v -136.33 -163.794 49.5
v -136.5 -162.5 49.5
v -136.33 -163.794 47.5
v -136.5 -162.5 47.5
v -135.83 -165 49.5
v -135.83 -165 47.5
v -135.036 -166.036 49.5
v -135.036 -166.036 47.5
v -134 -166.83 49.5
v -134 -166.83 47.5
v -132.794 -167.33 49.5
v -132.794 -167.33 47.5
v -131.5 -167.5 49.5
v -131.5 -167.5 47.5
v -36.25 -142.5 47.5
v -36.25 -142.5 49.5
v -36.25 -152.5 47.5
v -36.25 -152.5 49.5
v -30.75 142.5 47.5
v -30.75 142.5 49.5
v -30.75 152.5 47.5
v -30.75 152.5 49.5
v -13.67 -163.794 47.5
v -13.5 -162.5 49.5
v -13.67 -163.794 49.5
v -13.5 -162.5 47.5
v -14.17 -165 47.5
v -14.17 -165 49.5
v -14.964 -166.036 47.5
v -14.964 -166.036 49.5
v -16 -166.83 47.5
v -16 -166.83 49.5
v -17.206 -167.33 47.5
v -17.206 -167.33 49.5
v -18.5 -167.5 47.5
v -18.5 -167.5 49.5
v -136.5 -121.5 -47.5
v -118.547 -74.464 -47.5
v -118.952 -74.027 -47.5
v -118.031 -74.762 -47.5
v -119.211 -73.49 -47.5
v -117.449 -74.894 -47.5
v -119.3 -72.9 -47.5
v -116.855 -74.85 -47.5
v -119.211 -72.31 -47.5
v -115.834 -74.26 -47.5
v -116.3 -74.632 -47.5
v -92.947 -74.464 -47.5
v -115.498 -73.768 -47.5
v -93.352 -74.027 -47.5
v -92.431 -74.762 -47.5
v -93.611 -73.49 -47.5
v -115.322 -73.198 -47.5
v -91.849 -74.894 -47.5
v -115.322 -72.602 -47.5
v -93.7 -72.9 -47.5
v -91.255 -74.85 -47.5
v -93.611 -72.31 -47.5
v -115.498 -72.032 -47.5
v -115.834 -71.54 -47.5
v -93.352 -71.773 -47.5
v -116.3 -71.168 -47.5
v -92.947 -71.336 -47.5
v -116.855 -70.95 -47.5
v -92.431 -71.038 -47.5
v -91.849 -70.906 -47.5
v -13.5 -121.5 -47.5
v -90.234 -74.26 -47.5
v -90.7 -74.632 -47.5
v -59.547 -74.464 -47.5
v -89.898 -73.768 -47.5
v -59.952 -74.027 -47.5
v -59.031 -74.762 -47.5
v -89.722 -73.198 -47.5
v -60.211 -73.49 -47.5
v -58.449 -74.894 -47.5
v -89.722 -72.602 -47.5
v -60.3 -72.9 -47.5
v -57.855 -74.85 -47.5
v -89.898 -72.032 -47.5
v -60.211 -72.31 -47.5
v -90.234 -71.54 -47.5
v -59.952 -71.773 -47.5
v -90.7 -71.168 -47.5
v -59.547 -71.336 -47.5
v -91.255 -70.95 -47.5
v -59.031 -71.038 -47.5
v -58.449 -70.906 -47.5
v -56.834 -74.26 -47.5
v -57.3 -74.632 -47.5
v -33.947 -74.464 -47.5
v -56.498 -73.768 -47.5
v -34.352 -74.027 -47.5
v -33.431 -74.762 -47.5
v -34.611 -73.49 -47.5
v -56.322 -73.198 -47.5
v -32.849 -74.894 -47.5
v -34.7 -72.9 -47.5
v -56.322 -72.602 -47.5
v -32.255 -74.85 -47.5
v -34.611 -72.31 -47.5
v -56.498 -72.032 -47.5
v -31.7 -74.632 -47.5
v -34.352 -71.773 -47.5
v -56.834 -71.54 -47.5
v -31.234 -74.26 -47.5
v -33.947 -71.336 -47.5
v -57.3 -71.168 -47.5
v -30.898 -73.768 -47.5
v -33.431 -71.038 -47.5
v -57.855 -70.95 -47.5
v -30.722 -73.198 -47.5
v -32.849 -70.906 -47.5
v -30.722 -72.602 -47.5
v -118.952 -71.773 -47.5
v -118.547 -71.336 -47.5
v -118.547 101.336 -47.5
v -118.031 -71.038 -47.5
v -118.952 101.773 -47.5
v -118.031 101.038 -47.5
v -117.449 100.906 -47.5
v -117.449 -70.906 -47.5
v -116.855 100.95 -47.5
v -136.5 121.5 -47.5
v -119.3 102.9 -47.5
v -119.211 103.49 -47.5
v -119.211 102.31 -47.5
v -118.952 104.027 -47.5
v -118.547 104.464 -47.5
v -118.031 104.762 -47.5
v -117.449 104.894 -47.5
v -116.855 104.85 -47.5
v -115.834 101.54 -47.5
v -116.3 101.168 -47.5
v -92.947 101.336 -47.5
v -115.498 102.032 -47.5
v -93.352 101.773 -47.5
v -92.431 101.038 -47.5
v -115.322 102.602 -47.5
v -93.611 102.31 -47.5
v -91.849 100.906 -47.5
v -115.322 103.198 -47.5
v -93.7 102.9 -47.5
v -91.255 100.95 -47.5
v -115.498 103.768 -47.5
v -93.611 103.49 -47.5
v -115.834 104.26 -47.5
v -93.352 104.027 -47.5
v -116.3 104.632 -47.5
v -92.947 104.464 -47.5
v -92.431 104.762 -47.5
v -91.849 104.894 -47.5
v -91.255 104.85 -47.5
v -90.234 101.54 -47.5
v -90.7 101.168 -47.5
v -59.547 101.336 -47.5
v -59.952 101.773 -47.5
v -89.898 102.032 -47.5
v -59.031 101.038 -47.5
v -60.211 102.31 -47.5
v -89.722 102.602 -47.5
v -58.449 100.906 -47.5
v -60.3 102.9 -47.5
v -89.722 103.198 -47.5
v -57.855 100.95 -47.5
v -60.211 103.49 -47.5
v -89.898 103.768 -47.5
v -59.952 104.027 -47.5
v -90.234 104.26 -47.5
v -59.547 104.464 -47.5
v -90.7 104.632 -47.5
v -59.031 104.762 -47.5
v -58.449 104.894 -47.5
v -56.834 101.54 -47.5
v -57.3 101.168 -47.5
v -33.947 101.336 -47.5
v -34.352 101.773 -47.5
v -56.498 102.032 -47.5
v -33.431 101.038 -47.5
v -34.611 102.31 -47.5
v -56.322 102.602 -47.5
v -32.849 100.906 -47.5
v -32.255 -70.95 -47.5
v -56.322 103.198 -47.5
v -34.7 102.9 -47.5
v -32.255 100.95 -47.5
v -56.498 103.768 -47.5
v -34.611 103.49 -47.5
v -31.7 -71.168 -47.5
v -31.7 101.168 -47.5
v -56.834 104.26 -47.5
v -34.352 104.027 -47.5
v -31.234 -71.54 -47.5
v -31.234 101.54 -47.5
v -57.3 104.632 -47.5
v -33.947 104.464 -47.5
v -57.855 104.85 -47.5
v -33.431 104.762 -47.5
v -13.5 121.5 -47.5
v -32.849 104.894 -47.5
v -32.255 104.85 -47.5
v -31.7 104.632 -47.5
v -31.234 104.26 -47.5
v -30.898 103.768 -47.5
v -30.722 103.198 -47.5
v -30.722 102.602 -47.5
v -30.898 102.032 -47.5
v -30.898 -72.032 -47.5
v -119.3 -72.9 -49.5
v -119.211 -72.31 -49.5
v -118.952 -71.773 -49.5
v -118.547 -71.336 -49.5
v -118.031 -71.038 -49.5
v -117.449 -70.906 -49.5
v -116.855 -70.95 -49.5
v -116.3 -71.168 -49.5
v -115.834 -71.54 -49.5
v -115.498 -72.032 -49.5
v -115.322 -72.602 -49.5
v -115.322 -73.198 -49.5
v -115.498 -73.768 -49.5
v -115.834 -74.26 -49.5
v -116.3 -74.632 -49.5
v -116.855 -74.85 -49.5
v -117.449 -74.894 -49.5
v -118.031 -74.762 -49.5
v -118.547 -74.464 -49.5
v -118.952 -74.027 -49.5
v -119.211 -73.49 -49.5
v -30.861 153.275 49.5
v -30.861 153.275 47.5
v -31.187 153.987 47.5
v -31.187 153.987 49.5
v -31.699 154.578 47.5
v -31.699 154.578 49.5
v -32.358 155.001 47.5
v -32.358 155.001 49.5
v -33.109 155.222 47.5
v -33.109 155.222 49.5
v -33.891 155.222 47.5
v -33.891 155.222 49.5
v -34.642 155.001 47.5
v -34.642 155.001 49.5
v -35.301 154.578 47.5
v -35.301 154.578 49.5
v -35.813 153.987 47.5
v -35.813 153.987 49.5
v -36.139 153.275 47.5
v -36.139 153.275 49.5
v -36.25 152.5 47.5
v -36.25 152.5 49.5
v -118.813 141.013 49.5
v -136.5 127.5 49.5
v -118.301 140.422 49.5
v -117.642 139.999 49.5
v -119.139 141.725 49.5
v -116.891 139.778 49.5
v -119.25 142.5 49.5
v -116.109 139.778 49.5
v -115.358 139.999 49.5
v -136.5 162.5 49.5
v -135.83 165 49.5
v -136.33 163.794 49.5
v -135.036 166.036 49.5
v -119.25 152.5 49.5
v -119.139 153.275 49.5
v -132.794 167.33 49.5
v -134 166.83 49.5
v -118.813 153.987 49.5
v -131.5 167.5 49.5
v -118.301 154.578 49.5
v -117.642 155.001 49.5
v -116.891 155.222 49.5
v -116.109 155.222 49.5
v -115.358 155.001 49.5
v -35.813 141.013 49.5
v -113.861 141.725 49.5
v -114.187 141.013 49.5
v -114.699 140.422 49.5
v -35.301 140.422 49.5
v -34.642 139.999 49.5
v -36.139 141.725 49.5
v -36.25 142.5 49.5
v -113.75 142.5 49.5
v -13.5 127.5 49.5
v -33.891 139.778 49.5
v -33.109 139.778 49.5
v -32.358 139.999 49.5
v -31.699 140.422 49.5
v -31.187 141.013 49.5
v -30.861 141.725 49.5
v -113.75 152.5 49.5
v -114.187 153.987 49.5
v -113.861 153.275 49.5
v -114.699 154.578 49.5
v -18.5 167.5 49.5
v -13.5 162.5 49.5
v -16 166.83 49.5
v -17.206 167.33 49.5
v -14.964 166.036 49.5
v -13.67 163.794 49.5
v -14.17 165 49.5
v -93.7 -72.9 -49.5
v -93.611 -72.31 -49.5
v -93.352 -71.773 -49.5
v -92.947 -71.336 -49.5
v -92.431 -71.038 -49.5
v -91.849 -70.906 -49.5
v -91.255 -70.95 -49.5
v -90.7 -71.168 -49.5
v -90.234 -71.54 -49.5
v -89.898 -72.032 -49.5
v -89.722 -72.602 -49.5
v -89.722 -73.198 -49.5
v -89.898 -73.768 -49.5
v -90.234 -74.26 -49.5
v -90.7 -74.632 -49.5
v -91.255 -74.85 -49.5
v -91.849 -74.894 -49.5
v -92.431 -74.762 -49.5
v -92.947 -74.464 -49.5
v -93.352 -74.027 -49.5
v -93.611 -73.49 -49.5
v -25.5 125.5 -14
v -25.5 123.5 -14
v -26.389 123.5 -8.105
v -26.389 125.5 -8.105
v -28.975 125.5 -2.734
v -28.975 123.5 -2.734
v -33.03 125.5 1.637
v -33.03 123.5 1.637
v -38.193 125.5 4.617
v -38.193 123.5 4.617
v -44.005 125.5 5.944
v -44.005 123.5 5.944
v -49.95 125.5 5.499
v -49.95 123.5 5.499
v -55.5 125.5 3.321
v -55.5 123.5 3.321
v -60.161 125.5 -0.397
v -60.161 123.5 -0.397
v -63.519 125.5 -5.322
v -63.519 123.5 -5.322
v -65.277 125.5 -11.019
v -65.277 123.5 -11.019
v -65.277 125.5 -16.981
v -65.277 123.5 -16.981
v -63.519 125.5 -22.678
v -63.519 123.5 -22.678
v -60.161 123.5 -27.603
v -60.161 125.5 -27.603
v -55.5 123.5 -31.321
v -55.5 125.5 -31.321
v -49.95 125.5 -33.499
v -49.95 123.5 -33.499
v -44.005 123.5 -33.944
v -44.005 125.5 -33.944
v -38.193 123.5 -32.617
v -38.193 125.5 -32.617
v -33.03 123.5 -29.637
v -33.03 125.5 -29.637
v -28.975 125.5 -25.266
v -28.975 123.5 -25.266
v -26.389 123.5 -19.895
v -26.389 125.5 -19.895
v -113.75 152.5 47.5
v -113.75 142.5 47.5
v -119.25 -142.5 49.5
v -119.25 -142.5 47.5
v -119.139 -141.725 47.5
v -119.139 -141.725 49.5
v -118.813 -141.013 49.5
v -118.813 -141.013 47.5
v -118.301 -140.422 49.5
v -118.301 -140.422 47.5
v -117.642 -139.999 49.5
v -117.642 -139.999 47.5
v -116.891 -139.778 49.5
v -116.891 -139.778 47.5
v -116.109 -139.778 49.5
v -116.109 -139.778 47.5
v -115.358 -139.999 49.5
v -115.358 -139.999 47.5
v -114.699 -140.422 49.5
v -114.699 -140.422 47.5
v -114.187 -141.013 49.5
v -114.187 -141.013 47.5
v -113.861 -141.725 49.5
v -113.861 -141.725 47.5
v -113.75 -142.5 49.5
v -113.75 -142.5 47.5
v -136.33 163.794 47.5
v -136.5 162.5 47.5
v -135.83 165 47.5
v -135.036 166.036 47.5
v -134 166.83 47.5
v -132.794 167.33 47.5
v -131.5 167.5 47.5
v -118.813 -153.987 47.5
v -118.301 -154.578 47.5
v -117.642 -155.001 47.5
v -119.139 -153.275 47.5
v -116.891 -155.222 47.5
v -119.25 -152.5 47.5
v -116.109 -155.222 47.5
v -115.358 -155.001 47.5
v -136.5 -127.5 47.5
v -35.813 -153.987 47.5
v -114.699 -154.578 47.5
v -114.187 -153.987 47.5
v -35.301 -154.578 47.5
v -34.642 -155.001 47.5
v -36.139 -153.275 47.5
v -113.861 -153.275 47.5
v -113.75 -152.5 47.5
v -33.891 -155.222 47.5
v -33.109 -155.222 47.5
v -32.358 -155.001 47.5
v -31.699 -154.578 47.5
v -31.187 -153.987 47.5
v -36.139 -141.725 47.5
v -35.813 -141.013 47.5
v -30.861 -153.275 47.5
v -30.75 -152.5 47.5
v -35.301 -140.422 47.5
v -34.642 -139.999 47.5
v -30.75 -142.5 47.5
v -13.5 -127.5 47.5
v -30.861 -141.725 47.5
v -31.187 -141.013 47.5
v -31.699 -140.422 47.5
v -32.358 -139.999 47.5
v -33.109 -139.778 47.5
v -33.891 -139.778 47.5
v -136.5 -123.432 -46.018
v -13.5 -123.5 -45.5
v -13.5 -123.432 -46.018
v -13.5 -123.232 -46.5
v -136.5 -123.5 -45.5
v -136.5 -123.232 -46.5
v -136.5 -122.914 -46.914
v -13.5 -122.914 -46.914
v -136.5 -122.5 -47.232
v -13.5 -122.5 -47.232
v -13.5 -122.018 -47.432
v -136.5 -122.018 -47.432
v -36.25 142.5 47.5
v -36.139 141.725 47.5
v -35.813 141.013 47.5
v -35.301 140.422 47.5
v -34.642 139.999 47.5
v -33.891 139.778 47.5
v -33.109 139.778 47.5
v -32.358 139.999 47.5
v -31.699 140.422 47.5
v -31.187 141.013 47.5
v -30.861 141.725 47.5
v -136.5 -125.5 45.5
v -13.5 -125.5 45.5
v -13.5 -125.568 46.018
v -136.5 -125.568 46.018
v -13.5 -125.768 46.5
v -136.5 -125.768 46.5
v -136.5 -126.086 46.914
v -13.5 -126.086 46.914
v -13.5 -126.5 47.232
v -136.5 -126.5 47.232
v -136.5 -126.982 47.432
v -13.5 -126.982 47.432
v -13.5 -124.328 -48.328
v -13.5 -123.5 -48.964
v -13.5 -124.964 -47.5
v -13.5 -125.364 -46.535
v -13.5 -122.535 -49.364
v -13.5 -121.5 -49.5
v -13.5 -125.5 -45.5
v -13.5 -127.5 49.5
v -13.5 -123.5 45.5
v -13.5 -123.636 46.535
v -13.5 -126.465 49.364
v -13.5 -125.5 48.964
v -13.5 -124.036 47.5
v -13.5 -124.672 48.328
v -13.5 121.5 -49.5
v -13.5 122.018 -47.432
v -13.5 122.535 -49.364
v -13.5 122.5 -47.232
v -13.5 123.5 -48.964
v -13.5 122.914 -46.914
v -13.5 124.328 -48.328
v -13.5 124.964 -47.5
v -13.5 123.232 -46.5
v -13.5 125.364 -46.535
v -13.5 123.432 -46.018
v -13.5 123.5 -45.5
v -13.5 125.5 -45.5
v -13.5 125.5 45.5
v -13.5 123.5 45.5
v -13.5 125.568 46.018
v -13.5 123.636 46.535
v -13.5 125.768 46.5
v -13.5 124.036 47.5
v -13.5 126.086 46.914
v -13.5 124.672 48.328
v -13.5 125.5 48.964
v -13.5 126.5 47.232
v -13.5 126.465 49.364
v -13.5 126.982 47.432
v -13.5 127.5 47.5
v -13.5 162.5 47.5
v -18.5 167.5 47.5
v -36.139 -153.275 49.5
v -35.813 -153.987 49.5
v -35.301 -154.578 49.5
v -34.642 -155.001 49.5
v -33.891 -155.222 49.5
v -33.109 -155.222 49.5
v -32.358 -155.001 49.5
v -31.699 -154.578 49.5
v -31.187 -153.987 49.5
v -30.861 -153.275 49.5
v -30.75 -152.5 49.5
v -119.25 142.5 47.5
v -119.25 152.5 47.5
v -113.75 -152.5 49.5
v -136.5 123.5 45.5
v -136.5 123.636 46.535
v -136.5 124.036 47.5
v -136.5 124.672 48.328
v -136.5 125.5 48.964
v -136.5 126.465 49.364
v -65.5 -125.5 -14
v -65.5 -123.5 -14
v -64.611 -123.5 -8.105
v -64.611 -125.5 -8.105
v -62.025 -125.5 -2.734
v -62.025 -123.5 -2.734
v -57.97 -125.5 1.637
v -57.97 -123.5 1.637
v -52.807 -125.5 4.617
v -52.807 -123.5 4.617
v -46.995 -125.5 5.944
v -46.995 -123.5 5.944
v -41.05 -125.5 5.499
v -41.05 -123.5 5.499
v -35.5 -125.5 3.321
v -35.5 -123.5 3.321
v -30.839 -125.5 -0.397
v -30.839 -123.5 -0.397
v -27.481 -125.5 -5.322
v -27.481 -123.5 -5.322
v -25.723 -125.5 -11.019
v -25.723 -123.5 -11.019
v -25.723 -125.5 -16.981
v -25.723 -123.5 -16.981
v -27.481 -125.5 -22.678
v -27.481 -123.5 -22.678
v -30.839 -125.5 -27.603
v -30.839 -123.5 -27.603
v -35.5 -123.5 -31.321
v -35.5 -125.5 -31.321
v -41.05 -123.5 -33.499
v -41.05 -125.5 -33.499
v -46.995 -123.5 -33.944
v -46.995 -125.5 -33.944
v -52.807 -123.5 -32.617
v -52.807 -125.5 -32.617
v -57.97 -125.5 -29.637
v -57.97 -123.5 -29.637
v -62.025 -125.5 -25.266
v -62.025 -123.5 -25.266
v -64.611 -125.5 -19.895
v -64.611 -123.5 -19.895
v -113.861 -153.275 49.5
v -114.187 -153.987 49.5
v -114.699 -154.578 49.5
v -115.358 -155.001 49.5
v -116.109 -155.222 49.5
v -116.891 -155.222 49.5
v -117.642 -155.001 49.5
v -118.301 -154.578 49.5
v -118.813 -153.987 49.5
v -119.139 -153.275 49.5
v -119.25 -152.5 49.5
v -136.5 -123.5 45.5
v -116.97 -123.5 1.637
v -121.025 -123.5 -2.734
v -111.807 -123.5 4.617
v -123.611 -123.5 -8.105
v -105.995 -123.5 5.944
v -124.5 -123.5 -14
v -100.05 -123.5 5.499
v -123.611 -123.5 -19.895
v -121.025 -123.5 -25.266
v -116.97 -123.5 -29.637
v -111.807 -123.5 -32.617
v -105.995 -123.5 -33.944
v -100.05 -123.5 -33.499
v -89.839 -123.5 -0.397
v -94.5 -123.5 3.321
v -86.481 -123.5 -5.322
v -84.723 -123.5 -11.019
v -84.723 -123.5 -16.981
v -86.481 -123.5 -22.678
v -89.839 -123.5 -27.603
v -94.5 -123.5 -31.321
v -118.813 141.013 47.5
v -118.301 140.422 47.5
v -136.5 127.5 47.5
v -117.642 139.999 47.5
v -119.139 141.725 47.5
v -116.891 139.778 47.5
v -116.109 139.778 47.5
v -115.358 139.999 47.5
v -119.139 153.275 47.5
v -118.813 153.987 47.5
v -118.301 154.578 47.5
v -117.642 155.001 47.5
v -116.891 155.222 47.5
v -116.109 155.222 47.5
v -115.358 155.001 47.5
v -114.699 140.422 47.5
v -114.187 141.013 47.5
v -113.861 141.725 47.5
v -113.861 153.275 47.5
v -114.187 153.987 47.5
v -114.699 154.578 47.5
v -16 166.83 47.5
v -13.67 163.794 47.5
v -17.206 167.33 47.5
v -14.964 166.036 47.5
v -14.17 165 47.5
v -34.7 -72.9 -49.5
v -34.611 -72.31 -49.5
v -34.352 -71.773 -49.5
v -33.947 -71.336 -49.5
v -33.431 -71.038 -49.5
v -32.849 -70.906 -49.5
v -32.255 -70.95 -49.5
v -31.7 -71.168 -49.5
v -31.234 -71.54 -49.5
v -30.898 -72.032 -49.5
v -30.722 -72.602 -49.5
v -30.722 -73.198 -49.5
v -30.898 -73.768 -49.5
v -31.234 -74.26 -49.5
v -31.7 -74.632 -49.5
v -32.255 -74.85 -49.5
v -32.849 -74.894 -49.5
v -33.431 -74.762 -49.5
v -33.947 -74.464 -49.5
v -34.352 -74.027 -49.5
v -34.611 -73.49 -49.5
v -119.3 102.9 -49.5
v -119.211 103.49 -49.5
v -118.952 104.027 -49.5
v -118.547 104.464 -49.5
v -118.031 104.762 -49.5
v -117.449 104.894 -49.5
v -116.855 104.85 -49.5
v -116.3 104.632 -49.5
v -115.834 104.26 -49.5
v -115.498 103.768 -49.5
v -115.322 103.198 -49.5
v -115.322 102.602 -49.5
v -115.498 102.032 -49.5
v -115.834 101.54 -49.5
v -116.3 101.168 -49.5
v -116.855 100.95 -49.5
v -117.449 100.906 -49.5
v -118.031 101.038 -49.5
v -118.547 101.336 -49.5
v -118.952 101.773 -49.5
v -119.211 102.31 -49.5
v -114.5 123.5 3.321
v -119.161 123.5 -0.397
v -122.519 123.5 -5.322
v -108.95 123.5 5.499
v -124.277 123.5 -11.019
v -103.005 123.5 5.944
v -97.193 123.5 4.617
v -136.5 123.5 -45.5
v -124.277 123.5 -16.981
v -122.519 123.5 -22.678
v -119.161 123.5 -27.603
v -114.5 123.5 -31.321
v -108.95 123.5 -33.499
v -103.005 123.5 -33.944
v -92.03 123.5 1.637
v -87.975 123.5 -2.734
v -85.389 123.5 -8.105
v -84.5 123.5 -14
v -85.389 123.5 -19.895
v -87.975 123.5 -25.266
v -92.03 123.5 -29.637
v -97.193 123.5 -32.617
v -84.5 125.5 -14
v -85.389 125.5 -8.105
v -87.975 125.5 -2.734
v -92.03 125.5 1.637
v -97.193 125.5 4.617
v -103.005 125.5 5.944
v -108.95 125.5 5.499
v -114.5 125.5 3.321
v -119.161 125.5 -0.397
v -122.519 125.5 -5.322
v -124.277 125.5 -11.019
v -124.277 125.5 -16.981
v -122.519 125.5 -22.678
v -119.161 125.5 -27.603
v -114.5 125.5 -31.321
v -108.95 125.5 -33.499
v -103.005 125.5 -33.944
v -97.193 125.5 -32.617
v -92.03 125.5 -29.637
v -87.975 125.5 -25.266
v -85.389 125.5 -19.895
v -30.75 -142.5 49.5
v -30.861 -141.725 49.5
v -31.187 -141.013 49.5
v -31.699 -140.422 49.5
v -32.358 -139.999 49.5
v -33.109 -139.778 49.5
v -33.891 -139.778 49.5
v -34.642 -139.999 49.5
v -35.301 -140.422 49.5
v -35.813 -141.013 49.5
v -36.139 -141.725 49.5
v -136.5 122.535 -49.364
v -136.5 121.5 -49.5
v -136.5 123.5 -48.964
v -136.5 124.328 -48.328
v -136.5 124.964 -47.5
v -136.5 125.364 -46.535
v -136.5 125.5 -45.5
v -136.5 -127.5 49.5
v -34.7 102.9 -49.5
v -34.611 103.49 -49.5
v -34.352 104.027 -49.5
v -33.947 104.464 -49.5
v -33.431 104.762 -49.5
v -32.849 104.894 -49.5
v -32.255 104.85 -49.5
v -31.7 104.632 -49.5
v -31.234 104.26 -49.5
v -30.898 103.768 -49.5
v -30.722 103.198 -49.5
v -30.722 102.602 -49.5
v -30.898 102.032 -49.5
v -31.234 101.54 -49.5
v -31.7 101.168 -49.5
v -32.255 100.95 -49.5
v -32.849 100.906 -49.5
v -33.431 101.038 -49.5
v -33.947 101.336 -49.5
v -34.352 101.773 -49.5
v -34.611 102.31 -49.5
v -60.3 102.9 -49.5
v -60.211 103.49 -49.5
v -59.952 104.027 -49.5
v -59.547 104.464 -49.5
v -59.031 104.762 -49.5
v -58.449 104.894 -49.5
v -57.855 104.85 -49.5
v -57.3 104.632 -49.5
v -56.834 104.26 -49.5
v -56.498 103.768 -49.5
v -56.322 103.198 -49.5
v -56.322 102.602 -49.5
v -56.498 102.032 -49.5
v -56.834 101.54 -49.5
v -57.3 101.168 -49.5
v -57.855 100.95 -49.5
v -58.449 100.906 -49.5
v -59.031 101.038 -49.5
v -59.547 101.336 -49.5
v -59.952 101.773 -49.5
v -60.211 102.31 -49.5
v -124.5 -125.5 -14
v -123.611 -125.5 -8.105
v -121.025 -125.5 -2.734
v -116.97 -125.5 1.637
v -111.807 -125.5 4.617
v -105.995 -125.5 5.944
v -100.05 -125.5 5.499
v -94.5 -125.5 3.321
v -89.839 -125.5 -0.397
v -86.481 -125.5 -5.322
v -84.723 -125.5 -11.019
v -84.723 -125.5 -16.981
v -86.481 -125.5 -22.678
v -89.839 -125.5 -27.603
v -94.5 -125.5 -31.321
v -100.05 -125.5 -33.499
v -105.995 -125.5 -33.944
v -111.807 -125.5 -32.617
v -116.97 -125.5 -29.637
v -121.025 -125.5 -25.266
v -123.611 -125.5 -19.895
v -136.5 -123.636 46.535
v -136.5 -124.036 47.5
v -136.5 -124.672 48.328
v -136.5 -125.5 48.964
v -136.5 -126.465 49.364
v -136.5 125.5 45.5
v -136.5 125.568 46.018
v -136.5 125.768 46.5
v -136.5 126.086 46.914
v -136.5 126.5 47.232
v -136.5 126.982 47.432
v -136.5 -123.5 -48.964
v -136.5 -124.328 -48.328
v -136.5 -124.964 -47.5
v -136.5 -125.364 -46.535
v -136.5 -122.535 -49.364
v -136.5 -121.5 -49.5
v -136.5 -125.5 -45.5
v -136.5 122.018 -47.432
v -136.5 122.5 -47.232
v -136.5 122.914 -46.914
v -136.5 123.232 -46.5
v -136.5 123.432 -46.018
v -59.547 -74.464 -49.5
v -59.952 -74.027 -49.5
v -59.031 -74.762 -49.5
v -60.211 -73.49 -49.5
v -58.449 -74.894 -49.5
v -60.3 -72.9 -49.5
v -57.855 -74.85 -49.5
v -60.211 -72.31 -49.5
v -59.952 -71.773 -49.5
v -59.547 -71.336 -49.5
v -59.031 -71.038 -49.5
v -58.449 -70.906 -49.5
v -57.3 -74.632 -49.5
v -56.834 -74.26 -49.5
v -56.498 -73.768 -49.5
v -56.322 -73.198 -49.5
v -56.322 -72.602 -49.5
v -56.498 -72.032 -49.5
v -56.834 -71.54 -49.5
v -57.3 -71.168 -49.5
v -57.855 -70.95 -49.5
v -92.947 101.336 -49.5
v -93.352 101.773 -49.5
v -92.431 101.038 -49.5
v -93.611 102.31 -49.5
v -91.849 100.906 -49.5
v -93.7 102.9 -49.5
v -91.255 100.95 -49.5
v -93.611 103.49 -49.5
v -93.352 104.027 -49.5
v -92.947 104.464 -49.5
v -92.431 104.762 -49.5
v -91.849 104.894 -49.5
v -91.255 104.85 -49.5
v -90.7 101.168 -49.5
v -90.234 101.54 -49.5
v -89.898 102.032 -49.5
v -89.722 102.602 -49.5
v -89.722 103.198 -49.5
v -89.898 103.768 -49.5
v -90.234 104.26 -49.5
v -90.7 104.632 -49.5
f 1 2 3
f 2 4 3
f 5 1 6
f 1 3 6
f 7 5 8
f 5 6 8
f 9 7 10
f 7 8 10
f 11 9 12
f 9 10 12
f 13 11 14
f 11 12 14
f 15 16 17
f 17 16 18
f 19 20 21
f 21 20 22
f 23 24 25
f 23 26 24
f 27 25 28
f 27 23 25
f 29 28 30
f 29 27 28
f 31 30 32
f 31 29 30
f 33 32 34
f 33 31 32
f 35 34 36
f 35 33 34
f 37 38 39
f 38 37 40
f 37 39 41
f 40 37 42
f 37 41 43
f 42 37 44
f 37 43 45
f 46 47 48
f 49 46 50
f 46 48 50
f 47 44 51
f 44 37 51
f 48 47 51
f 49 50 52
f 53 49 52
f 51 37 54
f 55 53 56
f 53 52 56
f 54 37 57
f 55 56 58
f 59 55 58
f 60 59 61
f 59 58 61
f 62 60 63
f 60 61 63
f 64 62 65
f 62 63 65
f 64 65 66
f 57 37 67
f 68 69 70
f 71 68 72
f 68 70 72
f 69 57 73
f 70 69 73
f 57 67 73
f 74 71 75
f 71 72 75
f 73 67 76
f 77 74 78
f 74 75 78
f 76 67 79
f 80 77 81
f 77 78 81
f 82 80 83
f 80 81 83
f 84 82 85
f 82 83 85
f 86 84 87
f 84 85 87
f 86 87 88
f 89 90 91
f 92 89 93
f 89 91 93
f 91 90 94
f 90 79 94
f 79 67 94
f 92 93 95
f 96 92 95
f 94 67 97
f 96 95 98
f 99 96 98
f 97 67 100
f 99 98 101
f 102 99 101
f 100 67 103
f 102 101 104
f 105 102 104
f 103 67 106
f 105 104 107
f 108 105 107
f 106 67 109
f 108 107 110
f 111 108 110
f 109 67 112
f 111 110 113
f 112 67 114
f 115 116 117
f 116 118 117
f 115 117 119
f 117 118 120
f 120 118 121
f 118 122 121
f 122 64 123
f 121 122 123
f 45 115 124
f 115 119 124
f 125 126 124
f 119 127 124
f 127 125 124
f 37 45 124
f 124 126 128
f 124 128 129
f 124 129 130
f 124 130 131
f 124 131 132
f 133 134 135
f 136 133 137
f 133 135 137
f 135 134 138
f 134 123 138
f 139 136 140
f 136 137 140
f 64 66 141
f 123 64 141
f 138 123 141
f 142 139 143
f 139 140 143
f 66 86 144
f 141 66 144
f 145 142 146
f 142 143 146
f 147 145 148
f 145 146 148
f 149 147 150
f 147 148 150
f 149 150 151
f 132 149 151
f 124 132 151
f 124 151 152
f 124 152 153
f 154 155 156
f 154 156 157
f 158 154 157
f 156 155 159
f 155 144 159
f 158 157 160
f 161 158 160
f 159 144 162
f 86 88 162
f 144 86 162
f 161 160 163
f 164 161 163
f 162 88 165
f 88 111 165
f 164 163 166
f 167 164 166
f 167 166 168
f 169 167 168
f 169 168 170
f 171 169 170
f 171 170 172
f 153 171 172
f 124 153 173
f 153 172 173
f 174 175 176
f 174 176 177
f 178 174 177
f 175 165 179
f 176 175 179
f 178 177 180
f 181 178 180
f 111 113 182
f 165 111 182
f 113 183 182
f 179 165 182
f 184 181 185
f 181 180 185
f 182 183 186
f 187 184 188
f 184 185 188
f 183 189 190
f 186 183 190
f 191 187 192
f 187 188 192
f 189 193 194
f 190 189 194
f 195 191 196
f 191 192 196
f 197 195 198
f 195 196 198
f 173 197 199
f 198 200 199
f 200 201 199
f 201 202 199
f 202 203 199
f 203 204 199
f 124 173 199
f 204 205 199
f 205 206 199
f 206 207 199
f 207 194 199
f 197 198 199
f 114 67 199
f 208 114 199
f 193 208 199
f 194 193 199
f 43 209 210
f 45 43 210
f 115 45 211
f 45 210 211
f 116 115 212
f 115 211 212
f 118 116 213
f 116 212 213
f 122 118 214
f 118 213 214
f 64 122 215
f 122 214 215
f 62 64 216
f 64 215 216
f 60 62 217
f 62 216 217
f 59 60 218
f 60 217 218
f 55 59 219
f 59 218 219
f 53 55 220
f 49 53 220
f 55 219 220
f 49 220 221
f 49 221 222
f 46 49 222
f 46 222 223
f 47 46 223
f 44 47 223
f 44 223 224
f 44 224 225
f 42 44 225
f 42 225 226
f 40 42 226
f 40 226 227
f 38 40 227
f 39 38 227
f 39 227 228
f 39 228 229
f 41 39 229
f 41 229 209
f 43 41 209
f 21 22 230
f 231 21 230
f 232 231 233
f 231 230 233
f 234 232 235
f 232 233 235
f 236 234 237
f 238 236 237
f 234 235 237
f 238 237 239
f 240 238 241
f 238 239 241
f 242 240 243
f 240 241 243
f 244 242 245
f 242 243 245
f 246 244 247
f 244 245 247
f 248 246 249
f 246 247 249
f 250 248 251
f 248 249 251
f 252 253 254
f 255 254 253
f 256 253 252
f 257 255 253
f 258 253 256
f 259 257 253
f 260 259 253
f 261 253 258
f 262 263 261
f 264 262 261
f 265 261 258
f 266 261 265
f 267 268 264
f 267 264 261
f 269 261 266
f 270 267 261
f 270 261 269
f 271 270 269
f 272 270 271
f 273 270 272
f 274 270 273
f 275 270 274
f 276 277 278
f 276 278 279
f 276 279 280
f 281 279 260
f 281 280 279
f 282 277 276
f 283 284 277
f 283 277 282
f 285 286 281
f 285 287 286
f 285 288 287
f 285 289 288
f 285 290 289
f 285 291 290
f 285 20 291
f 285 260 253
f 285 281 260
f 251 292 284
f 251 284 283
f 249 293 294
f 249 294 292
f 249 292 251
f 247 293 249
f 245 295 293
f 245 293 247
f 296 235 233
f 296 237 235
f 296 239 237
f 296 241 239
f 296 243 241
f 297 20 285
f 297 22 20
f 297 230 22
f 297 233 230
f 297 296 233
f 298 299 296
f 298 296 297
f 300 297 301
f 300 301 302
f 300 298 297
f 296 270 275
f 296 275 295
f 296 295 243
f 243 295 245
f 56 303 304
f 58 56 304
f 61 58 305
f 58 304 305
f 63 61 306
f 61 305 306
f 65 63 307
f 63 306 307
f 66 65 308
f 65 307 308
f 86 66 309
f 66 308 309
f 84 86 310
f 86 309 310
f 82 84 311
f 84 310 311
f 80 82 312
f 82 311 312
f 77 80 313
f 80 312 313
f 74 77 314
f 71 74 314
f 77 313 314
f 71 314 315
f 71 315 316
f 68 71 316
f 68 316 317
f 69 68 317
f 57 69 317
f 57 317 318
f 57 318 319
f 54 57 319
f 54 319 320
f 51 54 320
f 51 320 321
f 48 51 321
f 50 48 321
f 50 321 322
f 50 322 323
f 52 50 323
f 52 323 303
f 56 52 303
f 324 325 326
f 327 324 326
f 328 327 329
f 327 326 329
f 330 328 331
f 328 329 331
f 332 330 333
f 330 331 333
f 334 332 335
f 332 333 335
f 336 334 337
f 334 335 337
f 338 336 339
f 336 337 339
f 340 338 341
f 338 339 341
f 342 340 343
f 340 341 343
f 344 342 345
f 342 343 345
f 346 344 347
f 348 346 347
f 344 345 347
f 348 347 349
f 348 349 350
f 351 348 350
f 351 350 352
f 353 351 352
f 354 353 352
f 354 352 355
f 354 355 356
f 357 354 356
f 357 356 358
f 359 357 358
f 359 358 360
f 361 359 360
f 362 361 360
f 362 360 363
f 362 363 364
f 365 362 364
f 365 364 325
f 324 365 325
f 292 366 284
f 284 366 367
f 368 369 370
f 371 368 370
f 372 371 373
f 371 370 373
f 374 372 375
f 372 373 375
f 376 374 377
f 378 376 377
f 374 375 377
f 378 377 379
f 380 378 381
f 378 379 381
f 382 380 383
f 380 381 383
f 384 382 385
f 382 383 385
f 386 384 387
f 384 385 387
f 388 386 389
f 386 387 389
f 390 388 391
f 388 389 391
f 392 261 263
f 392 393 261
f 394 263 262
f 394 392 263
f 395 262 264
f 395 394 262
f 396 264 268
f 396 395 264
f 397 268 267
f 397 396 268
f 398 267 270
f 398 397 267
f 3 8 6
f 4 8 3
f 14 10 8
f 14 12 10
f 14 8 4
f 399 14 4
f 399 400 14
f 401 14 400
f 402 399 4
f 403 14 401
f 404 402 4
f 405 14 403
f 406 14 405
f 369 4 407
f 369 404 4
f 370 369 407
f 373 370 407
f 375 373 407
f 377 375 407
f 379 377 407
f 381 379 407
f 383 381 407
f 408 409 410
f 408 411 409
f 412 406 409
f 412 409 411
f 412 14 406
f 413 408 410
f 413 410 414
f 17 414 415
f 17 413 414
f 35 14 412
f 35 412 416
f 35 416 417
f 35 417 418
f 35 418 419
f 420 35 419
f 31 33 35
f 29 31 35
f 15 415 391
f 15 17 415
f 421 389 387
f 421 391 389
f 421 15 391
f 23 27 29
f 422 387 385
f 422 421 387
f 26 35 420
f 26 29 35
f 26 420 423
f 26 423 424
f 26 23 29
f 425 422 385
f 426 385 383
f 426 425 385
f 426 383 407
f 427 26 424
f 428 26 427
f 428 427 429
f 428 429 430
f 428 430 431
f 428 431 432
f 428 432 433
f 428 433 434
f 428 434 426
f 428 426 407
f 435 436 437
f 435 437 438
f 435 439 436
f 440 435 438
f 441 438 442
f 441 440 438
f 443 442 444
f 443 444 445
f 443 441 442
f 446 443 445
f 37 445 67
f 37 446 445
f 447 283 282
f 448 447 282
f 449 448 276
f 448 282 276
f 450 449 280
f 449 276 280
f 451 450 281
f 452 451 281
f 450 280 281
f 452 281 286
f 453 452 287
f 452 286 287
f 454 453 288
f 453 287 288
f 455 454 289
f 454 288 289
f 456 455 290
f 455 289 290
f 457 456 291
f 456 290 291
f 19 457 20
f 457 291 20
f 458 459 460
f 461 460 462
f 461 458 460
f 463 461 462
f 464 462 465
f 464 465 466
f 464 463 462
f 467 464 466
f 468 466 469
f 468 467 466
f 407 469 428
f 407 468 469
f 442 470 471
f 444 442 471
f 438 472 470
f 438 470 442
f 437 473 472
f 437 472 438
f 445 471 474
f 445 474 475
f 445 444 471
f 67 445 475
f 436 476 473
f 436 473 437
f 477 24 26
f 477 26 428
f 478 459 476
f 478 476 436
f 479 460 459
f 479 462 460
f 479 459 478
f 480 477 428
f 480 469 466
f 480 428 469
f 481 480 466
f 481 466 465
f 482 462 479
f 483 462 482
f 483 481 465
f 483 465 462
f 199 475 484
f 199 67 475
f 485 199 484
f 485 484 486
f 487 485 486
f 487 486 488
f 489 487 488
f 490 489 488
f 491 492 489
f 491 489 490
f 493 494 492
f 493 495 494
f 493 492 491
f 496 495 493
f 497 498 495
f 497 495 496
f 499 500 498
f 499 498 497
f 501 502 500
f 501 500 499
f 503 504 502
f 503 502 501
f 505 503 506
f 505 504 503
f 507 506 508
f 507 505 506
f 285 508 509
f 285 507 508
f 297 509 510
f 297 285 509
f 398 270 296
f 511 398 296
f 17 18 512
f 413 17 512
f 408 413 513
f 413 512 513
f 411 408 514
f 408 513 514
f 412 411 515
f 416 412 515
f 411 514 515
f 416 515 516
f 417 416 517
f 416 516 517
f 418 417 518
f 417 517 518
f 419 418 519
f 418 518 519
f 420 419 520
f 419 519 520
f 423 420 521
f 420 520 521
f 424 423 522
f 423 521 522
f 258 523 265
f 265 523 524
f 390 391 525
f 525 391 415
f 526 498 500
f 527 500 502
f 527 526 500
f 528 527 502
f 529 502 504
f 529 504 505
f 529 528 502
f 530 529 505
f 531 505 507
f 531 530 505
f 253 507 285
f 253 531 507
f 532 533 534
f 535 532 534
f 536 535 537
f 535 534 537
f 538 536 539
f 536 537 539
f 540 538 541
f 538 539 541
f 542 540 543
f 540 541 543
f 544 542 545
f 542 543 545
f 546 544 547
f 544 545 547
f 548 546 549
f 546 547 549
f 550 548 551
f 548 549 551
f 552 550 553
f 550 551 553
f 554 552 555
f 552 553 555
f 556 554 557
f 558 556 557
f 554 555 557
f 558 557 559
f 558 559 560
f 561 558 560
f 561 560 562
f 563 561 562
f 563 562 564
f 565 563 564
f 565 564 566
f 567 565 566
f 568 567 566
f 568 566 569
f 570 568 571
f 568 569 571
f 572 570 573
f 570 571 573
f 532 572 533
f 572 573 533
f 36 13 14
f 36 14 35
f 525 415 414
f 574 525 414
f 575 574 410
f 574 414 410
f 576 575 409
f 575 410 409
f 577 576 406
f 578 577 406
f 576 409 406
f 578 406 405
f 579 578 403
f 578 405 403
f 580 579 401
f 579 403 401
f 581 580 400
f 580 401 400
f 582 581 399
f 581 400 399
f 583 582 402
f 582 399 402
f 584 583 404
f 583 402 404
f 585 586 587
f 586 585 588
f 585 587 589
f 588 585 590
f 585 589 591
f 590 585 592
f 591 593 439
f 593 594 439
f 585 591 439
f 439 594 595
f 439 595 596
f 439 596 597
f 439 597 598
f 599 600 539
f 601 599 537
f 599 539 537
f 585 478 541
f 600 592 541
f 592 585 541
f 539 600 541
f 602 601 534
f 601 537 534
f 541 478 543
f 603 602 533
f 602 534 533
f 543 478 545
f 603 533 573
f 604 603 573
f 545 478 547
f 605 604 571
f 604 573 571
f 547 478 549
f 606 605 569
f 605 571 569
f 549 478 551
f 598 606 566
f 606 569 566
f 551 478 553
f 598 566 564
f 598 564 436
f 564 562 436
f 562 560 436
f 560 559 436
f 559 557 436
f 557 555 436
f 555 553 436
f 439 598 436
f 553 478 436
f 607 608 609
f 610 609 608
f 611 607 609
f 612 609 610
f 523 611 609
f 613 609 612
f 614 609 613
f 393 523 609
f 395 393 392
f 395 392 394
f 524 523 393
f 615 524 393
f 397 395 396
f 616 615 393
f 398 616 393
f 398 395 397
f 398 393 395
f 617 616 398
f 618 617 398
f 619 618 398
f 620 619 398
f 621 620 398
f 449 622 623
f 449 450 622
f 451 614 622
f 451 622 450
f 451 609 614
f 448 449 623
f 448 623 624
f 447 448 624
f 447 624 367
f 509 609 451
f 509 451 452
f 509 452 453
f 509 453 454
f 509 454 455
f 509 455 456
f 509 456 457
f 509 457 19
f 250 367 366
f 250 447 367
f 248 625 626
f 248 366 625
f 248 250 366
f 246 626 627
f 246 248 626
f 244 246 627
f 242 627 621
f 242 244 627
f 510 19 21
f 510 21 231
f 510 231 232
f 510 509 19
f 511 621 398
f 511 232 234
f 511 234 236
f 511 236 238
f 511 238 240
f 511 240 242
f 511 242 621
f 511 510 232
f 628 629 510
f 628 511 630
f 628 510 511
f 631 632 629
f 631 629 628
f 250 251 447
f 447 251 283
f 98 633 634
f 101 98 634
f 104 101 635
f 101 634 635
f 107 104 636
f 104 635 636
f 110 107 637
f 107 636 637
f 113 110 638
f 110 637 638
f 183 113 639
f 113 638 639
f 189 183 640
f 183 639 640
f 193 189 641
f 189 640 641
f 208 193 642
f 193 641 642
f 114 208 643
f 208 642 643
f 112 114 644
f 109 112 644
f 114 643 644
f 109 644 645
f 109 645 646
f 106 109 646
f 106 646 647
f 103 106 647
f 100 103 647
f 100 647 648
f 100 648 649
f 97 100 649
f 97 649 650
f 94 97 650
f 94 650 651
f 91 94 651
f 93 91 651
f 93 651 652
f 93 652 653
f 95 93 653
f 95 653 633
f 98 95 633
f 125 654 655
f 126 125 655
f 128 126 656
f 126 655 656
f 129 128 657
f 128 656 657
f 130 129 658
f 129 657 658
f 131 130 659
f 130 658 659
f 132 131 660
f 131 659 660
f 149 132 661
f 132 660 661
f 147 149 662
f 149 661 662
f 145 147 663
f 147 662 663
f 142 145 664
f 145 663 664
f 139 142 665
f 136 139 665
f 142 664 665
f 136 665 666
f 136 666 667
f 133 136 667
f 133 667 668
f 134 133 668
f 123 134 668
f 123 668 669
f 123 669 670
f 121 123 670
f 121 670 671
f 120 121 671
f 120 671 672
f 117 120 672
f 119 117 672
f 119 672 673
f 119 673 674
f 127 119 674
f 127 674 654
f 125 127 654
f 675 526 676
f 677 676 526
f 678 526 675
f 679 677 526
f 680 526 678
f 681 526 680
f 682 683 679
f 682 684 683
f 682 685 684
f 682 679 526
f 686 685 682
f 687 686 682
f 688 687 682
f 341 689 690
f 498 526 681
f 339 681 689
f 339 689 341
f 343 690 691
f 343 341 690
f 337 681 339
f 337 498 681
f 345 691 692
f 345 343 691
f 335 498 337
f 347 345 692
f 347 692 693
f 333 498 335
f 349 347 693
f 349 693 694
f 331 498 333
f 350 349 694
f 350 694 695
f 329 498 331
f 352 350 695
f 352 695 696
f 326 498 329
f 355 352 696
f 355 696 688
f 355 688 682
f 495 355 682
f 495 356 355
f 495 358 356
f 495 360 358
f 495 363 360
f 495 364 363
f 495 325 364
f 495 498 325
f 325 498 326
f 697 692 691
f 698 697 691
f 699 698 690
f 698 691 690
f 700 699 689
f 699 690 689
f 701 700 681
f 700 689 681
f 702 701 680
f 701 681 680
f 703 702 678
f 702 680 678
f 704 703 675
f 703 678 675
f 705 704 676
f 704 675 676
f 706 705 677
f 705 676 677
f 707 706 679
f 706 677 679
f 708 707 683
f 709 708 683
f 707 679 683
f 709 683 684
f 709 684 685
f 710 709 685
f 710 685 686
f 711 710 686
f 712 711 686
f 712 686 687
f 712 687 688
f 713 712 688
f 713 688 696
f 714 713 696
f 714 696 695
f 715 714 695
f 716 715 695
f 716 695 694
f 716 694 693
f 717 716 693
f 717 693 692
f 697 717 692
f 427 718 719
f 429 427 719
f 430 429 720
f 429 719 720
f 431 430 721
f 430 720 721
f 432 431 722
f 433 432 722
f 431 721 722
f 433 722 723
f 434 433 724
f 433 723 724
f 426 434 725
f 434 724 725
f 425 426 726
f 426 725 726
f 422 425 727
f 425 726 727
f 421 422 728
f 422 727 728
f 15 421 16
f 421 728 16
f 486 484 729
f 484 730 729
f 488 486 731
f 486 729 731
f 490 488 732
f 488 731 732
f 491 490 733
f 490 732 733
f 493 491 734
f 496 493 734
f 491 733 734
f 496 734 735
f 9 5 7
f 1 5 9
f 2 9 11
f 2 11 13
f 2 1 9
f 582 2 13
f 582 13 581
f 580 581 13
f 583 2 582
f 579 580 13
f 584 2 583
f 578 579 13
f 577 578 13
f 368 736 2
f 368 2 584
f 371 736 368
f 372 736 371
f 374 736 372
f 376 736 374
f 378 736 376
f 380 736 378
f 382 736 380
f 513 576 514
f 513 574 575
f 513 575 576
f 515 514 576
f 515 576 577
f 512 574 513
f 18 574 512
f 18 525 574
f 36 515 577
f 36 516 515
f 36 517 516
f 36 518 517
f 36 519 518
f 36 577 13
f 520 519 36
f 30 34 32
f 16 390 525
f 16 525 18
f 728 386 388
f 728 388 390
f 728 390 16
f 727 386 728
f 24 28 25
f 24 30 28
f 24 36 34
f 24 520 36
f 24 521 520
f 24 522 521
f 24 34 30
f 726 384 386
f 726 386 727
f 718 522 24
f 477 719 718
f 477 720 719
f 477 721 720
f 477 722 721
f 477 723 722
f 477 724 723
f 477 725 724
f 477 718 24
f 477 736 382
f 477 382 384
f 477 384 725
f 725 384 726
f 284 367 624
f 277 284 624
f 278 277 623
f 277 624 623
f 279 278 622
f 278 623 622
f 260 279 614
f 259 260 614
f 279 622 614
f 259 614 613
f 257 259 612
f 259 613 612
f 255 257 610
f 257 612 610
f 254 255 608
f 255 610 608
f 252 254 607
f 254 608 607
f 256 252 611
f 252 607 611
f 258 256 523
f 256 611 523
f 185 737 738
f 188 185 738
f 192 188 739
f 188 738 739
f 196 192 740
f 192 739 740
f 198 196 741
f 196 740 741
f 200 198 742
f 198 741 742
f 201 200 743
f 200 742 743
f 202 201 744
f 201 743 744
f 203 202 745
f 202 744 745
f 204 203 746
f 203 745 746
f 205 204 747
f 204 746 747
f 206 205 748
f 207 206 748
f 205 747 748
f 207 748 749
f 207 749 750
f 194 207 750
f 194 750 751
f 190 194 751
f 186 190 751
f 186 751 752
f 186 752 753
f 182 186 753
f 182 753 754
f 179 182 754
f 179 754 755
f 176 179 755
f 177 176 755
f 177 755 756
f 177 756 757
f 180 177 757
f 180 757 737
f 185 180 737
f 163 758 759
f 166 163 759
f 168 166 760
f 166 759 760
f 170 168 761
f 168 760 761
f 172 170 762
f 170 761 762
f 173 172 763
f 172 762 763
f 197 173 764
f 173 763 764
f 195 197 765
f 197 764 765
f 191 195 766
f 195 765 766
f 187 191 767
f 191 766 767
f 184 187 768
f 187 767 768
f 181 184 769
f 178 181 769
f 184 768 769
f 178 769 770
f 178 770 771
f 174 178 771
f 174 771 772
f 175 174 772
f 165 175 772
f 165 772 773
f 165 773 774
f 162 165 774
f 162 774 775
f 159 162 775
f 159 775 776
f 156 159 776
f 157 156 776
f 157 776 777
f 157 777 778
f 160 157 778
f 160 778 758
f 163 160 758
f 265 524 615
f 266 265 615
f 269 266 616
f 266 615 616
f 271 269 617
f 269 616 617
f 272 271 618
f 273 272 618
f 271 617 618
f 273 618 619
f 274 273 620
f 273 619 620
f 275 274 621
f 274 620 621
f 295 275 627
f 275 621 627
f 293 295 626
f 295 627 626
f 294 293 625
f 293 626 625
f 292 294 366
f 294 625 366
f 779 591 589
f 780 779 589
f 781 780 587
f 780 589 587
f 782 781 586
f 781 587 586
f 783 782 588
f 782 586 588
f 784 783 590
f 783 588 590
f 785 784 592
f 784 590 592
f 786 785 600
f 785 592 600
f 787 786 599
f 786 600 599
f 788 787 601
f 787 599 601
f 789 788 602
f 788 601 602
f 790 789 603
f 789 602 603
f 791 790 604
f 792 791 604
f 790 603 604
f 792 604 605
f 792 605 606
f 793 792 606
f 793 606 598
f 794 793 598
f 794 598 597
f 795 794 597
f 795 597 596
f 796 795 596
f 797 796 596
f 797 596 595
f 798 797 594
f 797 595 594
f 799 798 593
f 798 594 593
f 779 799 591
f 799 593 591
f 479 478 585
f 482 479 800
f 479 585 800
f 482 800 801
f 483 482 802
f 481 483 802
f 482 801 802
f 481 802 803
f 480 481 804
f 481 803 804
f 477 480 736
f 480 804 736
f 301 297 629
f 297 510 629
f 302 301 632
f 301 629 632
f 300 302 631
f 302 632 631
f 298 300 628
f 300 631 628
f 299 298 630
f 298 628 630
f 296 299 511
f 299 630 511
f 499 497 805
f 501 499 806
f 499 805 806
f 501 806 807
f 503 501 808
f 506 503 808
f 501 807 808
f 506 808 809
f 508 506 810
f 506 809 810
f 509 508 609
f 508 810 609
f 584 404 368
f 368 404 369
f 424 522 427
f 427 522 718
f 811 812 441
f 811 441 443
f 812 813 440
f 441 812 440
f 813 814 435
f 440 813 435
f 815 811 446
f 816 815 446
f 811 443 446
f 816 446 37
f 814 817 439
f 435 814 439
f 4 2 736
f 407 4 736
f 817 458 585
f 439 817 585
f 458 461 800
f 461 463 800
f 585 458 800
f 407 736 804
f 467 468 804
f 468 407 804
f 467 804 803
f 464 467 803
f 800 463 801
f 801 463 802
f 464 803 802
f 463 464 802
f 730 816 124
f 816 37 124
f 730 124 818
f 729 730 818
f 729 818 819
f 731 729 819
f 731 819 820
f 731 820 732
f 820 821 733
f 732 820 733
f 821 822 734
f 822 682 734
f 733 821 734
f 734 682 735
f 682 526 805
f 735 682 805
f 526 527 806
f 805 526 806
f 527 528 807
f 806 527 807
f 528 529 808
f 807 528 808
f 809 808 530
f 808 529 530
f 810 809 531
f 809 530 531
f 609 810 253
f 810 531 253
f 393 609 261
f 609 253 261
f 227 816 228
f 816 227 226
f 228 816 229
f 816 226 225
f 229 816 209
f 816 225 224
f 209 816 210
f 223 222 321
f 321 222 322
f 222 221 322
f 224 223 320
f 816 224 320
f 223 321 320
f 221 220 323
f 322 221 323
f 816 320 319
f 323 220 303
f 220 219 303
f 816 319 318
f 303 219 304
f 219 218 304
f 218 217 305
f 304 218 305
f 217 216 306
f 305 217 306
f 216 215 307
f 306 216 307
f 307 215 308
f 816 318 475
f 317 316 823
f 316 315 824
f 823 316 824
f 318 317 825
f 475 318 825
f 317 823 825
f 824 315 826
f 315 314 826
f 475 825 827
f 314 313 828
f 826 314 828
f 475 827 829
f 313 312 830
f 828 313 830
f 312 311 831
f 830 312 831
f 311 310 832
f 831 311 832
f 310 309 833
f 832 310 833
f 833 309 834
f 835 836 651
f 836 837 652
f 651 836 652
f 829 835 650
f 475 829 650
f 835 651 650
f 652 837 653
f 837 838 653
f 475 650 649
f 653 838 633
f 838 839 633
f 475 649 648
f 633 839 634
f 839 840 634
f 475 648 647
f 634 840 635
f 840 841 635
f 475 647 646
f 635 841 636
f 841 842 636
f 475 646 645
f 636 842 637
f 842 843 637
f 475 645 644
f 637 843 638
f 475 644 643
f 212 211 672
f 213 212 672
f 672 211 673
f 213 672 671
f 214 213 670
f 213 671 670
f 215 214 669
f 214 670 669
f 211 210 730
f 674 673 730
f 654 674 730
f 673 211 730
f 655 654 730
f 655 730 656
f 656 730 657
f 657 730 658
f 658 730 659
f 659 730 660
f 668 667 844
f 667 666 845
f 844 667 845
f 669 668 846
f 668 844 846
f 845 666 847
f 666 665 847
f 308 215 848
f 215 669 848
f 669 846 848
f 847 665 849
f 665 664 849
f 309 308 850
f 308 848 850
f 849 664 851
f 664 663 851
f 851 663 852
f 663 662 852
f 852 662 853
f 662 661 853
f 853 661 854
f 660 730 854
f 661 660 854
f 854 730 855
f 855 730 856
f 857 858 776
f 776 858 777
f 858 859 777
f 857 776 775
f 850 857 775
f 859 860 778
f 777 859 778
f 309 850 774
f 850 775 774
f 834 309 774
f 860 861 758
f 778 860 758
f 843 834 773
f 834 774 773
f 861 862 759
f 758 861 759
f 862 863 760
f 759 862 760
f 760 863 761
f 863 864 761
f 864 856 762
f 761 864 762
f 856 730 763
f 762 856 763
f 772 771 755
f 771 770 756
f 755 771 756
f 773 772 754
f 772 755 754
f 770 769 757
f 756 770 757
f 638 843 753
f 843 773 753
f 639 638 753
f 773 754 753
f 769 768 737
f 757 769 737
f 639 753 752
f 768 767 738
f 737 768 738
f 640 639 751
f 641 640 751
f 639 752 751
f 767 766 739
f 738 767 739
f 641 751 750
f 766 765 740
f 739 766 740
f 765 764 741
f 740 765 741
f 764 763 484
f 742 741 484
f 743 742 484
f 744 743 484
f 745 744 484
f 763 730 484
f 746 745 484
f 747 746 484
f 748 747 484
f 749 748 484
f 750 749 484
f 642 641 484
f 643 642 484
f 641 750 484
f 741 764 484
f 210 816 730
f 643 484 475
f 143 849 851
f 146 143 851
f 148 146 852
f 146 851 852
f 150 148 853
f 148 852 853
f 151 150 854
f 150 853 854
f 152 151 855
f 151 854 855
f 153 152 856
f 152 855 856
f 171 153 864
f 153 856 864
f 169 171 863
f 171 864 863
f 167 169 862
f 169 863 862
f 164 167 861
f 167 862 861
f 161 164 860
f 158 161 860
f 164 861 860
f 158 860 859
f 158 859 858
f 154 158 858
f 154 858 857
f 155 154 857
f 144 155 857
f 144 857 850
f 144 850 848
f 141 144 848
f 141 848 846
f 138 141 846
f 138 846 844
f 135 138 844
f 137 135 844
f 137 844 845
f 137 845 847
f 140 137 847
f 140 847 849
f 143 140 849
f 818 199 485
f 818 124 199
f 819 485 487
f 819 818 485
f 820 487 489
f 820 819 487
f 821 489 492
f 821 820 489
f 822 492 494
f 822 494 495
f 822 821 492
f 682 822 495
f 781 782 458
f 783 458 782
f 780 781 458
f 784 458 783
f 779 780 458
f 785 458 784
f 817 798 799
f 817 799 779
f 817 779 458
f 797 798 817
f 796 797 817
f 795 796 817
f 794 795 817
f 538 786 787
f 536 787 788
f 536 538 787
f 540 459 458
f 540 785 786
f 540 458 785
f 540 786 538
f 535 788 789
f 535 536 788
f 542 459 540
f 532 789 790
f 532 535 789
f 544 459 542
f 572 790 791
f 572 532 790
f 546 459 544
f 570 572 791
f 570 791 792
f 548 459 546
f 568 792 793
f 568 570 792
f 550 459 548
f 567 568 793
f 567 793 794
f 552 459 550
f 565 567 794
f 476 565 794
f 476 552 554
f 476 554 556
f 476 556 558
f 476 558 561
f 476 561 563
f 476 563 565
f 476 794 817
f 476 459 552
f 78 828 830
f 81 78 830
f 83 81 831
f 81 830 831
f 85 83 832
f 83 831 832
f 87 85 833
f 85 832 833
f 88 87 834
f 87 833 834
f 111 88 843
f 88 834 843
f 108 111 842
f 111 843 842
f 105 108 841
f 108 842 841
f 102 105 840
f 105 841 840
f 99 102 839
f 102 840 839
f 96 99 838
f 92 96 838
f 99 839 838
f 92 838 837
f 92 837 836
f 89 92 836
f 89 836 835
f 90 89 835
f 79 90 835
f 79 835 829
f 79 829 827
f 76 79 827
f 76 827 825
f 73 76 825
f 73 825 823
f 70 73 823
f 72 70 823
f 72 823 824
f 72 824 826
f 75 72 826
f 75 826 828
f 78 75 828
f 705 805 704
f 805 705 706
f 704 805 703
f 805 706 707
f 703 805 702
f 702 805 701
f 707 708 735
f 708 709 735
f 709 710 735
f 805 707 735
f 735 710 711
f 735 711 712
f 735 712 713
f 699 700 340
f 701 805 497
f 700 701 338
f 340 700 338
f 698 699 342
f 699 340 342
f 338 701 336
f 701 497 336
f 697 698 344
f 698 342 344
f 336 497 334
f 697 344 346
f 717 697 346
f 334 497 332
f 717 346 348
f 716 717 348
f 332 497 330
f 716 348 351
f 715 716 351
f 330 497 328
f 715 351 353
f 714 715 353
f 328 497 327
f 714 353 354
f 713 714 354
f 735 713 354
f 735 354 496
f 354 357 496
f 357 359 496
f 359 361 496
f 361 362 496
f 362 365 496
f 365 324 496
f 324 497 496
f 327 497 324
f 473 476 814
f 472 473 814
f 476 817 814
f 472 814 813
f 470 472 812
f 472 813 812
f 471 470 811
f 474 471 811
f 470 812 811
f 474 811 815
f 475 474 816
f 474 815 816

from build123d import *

# Parameters (mm, degrees)
SKETCH_1_W           = 123
SKETCH_1_H           = 335
EXTRUDE_1_DEPTH      = 99
SKETCH_2_W           = 97
SKETCH_2_H           = 247
CUT_EXTRUDE_1_DEPTH  = 214.62467086
SKETCH_3_W           = 97
SKETCH_3_H           = 42
CUT_EXTRUDE_2_DEPTH  = 214.62467086
SKETCH_4_W           = 97
SKETCH_4_H           = 42
CUT_EXTRUDE_3_DEPTH  = 214.62467086
CUT_EXTRUDE_4_DEPTH  = 238.675198538
CUT_EXTRUDE_5_DEPTH  = 237.849108084
CUT_EXTRUDE_6_DEPTH  = 238.675198538
CUT_EXTRUDE_7_DEPTH  = 237.849108084
HOLE_WIZARD_M4_1_D   = 4
HOLE_WIZARD_M4_2_D   = 4
HOLE_WIZARD_M4_3_D   = 4
HOLE_WIZARD_M4_4_D   = 4
HOLE_WIZARD_M4_5_D   = 4
HOLE_WIZARD_M4_6_D   = 4
HOLE_WIZARD_M4_7_D   = 4
HOLE_WIZARD_M4_8_D   = 4
HOLE_WIZARD_9_D      = 40
HOLE_WIZARD_9_DEPTH  = 2
HOLE_WIZARD_10_D     = 40
HOLE_WIZARD_10_DEPTH = 2
HOLE_WIZARD_11_D     = 40
HOLE_WIZARD_11_DEPTH = 293
HOLE_WIZARD_12_D     = 40
HOLE_WIZARD_12_DEPTH = 293
FILLET_1_R           = 2
FILLET_2_R           = 2
FILLET_3_R           = 2
FILLET_4_R           = 2
FILLET_5_R           = 4
FILLET_6_R           = 4
FILLET_7_R           = 4
FILLET_8_R           = 4
FILLET_9_R           = 5
FILLET_10_R          = 5
FILLET_11_R          = 5
FILLET_12_R          = 5


with BuildPart() as part:
    # 草图1 → 凸台-拉伸1 (new body)
    with BuildSketch(Plane.XY.offset(49.5)):
        with Locations((-75, 0)):
            Rectangle(SKETCH_1_W, SKETCH_1_H)
    extrude(amount=-EXTRUDE_1_DEPTH)

    # 草图2 → 切除-拉伸1 (cut, through all)
    with BuildSketch(Plane(origin=(-13.5, 0, 0), x_dir=(0, 0, -1), z_dir=(1, 0, 0))):
        with Locations((-1, 0)):
            Rectangle(SKETCH_2_W, SKETCH_2_H)
    extrude(amount=-CUT_EXTRUDE_1_DEPTH, mode=Mode.SUBTRACT)

    # 草图3 → 切除-拉伸2 (cut, through all)
    with BuildSketch(Plane(origin=(-13.5, 0, 0), x_dir=(0, 0, -1), z_dir=(1, 0, 0))):
        with Locations((1, 146.5)):
            Rectangle(SKETCH_3_W, SKETCH_3_H)
    extrude(amount=-CUT_EXTRUDE_2_DEPTH, mode=Mode.SUBTRACT)

    # 草图4 → 切除-拉伸3 (cut, through all)
    with BuildSketch(Plane(origin=(-13.5, 0, 0), x_dir=(0, 0, -1), z_dir=(1, 0, 0))):
        with Locations((1, -146.5)):
            Rectangle(SKETCH_4_W, SKETCH_4_H)
    extrude(amount=-CUT_EXTRUDE_3_DEPTH, mode=Mode.SUBTRACT)

    # 草图5 → 切除-拉伸4 (cut, through all)
    with BuildSketch(Plane.XY.offset(49.5)):
        with BuildLine():
            Line((-30.75, 142.5), (-30.75, 152.5))
            ThreePointArc((-30.75, 152.5), (-33.5, 155.25), (-36.25, 152.5))
            Line((-36.25, 152.5), (-36.25, 142.5))
            ThreePointArc((-36.25, 142.5), (-33.5, 139.75), (-30.75, 142.5))
        make_face()
    extrude(amount=-CUT_EXTRUDE_4_DEPTH, mode=Mode.SUBTRACT)

    # 草图6 → 切除-拉伸5 (cut, through all)
    with BuildSketch(Plane(origin=(0, 0, 47.5), x_dir=(-1, 0, 0), z_dir=(0, 0, -1))):
        with BuildLine():
            Line((113.75, 152.5), (113.75, 142.5))
            ThreePointArc((113.75, 142.5), (116.5, 139.75), (119.25, 142.5))
            Line((119.25, 142.5), (119.25, 152.5))
            ThreePointArc((119.25, 152.5), (116.5, 155.25), (113.75, 152.5))
        make_face()
    extrude(amount=-CUT_EXTRUDE_5_DEPTH, mode=Mode.SUBTRACT)

    # 草图7 → 切除-拉伸6 (cut, through all)
    with BuildSketch(Plane.XY.offset(49.5)):
        with BuildLine():
            Line((-30.75, -152.5), (-30.75, -142.5))
            ThreePointArc((-30.75, -142.5), (-33.5, -139.75), (-36.25, -142.5))
            Line((-36.25, -142.5), (-36.25, -152.5))
            ThreePointArc((-36.25, -152.5), (-33.5, -155.25), (-30.75, -152.5))
        make_face()
    extrude(amount=-CUT_EXTRUDE_6_DEPTH, mode=Mode.SUBTRACT)

    # 草图8 → 切除-拉伸7 (cut, through all)
    with BuildSketch(Plane(origin=(0, 0, 47.5), x_dir=(-1, 0, 0), z_dir=(0, 0, -1))):
        with BuildLine():
            Line((113.75, -142.5), (113.75, -152.5))
            ThreePointArc((113.75, -152.5), (116.5, -155.25), (119.25, -152.5))
            Line((119.25, -152.5), (119.25, -142.5))
            ThreePointArc((119.25, -142.5), (116.5, -139.75), (113.75, -142.5))
        make_face()
    extrude(amount=-CUT_EXTRUDE_7_DEPTH, mode=Mode.SUBTRACT)

    # M4 螺纹孔1 (through all)
    with Locations(Plane.XY.offset(-47.5)):
        with Locations((-117.3, -72.9)):
            Hole(HOLE_WIZARD_M4_1_D / 2)

    # M4 螺纹孔2 (through all)
    with Locations(Plane.XY.offset(-47.5)):
        with Locations((-91.7, -72.9)):
            Hole(HOLE_WIZARD_M4_2_D / 2)

    # M4 螺纹孔3 (through all)
    with Locations(Plane.XY.offset(-47.5)):
        with Locations((-32.7, -72.9)):
            Hole(HOLE_WIZARD_M4_3_D / 2)

    # M4 螺纹孔4 (through all)
    with Locations(Plane.XY.offset(-47.5)):
        with Locations((-58.3, -72.9)):
            Hole(HOLE_WIZARD_M4_4_D / 2)

    # M4 螺纹孔5 (through all)
    with Locations(Plane.XY.offset(-47.5)):
        with Locations((-91.7, 102.9)):
            Hole(HOLE_WIZARD_M4_5_D / 2)

    # M4 螺纹孔6 (through all)
    with Locations(Plane.XY.offset(-47.5)):
        with Locations((-117.3, 102.9)):
            Hole(HOLE_WIZARD_M4_6_D / 2)

    # M4 螺纹孔7 (through all)
    with Locations(Plane.XY.offset(-47.5)):
        with Locations((-32.7, 102.9)):
            Hole(HOLE_WIZARD_M4_7_D / 2)

    # M4 螺纹孔8 (through all)
    with Locations(Plane.XY.offset(-47.5)):
        with Locations((-58.3, 102.9)):
            Hole(HOLE_WIZARD_M4_8_D / 2)

    # 孔9
    with Locations(Plane.XZ.offset(125.5)):
        with Locations((-45.5, -14)):
            Hole(HOLE_WIZARD_9_D / 2, depth=HOLE_WIZARD_9_DEPTH)

    # 孔10
    with Locations(Plane.XZ.offset(125.5)):
        with Locations((-104.5, -14)):
            Hole(HOLE_WIZARD_10_D / 2, depth=HOLE_WIZARD_10_DEPTH)

    # 孔11
    with Locations(Plane(origin=(0, 125.5, 0), x_dir=(-1, 0, 0), z_dir=(0, 1, 0))):
        with Locations((104.5, -14)):
            Hole(HOLE_WIZARD_11_D / 2, depth=HOLE_WIZARD_11_DEPTH)

    # 孔12
    with Locations(Plane(origin=(0, 125.5, 0), x_dir=(-1, 0, 0), z_dir=(0, 1, 0))):
        with Locations((45.5, -14)):
            Hole(HOLE_WIZARD_12_D / 2, depth=HOLE_WIZARD_12_DEPTH)

    # 圆角1
    fillet_1_edges = [part.edges().sort_by_distance(p)[0] for p in [
        (-75, 125.5, 47.5),
    ]]
    fillet(fillet_1_edges, radius=FILLET_1_R)

    # 圆角2
    fillet_2_edges = [part.edges().sort_by_distance(p)[0] for p in [
        (-75, -125.5, 47.5),
    ]]
    fillet(fillet_2_edges, radius=FILLET_2_R)

    # 圆角3
    fillet_3_edges = [part.edges().sort_by_distance(p)[0] for p in [
        (-75, -123.5, -47.5),
    ]]
    fillet(fillet_3_edges, radius=FILLET_3_R)

    # 圆角4
    fillet_4_edges = [part.edges().sort_by_distance(p)[0] for p in [
        (-75, 123.5, -47.5),
    ]]
    fillet(fillet_4_edges, radius=FILLET_4_R)

    # 圆角5
    fillet_5_edges = [part.edges().sort_by_distance(p)[0] for p in [
        (-75, 123.5, 49.5),
    ]]
    fillet(fillet_5_edges, radius=FILLET_5_R)

    # 圆角6
    fillet_6_edges = [part.edges().sort_by_distance(p)[0] for p in [
        (-75, -123.5, 49.5),
    ]]
    fillet(fillet_6_edges, radius=FILLET_6_R)

    # 圆角7
    fillet_7_edges = [part.edges().sort_by_distance(p)[0] for p in [
        (-75, -125.5, -49.5),
    ]]
    fillet(fillet_7_edges, radius=FILLET_7_R)

    # 圆角8
    fillet_8_edges = [part.edges().sort_by_distance(p)[0] for p in [
        (-75, 125.5, -49.5),
    ]]
    fillet(fillet_8_edges, radius=FILLET_8_R)

    # 圆角9
    fillet_9_edges = [part.edges().sort_by_distance(p)[0] for p in [
        (-136.5, -167.5, 48.5),
    ]]
    fillet(fillet_9_edges, radius=FILLET_9_R)

    # 圆角10
    fillet_10_edges = [part.edges().sort_by_distance(p)[0] for p in [
        (-136.5, 167.5, 48.5),
    ]]
    fillet(fillet_10_edges, radius=FILLET_10_R)

    # 圆角11
    fillet_11_edges = [part.edges().sort_by_distance(p)[0] for p in [
        (-13.5, -167.5, 48.5),
    ]]
    fillet(fillet_11_edges, radius=FILLET_11_R)

    # 圆角12
    fillet_12_edges = [part.edges().sort_by_distance(p)[0] for p in [
        (-13.5, 167.5, 48.5),
    ]]
    fillet(fillet_12_edges, radius=FILLET_12_R)


solid = part.part
